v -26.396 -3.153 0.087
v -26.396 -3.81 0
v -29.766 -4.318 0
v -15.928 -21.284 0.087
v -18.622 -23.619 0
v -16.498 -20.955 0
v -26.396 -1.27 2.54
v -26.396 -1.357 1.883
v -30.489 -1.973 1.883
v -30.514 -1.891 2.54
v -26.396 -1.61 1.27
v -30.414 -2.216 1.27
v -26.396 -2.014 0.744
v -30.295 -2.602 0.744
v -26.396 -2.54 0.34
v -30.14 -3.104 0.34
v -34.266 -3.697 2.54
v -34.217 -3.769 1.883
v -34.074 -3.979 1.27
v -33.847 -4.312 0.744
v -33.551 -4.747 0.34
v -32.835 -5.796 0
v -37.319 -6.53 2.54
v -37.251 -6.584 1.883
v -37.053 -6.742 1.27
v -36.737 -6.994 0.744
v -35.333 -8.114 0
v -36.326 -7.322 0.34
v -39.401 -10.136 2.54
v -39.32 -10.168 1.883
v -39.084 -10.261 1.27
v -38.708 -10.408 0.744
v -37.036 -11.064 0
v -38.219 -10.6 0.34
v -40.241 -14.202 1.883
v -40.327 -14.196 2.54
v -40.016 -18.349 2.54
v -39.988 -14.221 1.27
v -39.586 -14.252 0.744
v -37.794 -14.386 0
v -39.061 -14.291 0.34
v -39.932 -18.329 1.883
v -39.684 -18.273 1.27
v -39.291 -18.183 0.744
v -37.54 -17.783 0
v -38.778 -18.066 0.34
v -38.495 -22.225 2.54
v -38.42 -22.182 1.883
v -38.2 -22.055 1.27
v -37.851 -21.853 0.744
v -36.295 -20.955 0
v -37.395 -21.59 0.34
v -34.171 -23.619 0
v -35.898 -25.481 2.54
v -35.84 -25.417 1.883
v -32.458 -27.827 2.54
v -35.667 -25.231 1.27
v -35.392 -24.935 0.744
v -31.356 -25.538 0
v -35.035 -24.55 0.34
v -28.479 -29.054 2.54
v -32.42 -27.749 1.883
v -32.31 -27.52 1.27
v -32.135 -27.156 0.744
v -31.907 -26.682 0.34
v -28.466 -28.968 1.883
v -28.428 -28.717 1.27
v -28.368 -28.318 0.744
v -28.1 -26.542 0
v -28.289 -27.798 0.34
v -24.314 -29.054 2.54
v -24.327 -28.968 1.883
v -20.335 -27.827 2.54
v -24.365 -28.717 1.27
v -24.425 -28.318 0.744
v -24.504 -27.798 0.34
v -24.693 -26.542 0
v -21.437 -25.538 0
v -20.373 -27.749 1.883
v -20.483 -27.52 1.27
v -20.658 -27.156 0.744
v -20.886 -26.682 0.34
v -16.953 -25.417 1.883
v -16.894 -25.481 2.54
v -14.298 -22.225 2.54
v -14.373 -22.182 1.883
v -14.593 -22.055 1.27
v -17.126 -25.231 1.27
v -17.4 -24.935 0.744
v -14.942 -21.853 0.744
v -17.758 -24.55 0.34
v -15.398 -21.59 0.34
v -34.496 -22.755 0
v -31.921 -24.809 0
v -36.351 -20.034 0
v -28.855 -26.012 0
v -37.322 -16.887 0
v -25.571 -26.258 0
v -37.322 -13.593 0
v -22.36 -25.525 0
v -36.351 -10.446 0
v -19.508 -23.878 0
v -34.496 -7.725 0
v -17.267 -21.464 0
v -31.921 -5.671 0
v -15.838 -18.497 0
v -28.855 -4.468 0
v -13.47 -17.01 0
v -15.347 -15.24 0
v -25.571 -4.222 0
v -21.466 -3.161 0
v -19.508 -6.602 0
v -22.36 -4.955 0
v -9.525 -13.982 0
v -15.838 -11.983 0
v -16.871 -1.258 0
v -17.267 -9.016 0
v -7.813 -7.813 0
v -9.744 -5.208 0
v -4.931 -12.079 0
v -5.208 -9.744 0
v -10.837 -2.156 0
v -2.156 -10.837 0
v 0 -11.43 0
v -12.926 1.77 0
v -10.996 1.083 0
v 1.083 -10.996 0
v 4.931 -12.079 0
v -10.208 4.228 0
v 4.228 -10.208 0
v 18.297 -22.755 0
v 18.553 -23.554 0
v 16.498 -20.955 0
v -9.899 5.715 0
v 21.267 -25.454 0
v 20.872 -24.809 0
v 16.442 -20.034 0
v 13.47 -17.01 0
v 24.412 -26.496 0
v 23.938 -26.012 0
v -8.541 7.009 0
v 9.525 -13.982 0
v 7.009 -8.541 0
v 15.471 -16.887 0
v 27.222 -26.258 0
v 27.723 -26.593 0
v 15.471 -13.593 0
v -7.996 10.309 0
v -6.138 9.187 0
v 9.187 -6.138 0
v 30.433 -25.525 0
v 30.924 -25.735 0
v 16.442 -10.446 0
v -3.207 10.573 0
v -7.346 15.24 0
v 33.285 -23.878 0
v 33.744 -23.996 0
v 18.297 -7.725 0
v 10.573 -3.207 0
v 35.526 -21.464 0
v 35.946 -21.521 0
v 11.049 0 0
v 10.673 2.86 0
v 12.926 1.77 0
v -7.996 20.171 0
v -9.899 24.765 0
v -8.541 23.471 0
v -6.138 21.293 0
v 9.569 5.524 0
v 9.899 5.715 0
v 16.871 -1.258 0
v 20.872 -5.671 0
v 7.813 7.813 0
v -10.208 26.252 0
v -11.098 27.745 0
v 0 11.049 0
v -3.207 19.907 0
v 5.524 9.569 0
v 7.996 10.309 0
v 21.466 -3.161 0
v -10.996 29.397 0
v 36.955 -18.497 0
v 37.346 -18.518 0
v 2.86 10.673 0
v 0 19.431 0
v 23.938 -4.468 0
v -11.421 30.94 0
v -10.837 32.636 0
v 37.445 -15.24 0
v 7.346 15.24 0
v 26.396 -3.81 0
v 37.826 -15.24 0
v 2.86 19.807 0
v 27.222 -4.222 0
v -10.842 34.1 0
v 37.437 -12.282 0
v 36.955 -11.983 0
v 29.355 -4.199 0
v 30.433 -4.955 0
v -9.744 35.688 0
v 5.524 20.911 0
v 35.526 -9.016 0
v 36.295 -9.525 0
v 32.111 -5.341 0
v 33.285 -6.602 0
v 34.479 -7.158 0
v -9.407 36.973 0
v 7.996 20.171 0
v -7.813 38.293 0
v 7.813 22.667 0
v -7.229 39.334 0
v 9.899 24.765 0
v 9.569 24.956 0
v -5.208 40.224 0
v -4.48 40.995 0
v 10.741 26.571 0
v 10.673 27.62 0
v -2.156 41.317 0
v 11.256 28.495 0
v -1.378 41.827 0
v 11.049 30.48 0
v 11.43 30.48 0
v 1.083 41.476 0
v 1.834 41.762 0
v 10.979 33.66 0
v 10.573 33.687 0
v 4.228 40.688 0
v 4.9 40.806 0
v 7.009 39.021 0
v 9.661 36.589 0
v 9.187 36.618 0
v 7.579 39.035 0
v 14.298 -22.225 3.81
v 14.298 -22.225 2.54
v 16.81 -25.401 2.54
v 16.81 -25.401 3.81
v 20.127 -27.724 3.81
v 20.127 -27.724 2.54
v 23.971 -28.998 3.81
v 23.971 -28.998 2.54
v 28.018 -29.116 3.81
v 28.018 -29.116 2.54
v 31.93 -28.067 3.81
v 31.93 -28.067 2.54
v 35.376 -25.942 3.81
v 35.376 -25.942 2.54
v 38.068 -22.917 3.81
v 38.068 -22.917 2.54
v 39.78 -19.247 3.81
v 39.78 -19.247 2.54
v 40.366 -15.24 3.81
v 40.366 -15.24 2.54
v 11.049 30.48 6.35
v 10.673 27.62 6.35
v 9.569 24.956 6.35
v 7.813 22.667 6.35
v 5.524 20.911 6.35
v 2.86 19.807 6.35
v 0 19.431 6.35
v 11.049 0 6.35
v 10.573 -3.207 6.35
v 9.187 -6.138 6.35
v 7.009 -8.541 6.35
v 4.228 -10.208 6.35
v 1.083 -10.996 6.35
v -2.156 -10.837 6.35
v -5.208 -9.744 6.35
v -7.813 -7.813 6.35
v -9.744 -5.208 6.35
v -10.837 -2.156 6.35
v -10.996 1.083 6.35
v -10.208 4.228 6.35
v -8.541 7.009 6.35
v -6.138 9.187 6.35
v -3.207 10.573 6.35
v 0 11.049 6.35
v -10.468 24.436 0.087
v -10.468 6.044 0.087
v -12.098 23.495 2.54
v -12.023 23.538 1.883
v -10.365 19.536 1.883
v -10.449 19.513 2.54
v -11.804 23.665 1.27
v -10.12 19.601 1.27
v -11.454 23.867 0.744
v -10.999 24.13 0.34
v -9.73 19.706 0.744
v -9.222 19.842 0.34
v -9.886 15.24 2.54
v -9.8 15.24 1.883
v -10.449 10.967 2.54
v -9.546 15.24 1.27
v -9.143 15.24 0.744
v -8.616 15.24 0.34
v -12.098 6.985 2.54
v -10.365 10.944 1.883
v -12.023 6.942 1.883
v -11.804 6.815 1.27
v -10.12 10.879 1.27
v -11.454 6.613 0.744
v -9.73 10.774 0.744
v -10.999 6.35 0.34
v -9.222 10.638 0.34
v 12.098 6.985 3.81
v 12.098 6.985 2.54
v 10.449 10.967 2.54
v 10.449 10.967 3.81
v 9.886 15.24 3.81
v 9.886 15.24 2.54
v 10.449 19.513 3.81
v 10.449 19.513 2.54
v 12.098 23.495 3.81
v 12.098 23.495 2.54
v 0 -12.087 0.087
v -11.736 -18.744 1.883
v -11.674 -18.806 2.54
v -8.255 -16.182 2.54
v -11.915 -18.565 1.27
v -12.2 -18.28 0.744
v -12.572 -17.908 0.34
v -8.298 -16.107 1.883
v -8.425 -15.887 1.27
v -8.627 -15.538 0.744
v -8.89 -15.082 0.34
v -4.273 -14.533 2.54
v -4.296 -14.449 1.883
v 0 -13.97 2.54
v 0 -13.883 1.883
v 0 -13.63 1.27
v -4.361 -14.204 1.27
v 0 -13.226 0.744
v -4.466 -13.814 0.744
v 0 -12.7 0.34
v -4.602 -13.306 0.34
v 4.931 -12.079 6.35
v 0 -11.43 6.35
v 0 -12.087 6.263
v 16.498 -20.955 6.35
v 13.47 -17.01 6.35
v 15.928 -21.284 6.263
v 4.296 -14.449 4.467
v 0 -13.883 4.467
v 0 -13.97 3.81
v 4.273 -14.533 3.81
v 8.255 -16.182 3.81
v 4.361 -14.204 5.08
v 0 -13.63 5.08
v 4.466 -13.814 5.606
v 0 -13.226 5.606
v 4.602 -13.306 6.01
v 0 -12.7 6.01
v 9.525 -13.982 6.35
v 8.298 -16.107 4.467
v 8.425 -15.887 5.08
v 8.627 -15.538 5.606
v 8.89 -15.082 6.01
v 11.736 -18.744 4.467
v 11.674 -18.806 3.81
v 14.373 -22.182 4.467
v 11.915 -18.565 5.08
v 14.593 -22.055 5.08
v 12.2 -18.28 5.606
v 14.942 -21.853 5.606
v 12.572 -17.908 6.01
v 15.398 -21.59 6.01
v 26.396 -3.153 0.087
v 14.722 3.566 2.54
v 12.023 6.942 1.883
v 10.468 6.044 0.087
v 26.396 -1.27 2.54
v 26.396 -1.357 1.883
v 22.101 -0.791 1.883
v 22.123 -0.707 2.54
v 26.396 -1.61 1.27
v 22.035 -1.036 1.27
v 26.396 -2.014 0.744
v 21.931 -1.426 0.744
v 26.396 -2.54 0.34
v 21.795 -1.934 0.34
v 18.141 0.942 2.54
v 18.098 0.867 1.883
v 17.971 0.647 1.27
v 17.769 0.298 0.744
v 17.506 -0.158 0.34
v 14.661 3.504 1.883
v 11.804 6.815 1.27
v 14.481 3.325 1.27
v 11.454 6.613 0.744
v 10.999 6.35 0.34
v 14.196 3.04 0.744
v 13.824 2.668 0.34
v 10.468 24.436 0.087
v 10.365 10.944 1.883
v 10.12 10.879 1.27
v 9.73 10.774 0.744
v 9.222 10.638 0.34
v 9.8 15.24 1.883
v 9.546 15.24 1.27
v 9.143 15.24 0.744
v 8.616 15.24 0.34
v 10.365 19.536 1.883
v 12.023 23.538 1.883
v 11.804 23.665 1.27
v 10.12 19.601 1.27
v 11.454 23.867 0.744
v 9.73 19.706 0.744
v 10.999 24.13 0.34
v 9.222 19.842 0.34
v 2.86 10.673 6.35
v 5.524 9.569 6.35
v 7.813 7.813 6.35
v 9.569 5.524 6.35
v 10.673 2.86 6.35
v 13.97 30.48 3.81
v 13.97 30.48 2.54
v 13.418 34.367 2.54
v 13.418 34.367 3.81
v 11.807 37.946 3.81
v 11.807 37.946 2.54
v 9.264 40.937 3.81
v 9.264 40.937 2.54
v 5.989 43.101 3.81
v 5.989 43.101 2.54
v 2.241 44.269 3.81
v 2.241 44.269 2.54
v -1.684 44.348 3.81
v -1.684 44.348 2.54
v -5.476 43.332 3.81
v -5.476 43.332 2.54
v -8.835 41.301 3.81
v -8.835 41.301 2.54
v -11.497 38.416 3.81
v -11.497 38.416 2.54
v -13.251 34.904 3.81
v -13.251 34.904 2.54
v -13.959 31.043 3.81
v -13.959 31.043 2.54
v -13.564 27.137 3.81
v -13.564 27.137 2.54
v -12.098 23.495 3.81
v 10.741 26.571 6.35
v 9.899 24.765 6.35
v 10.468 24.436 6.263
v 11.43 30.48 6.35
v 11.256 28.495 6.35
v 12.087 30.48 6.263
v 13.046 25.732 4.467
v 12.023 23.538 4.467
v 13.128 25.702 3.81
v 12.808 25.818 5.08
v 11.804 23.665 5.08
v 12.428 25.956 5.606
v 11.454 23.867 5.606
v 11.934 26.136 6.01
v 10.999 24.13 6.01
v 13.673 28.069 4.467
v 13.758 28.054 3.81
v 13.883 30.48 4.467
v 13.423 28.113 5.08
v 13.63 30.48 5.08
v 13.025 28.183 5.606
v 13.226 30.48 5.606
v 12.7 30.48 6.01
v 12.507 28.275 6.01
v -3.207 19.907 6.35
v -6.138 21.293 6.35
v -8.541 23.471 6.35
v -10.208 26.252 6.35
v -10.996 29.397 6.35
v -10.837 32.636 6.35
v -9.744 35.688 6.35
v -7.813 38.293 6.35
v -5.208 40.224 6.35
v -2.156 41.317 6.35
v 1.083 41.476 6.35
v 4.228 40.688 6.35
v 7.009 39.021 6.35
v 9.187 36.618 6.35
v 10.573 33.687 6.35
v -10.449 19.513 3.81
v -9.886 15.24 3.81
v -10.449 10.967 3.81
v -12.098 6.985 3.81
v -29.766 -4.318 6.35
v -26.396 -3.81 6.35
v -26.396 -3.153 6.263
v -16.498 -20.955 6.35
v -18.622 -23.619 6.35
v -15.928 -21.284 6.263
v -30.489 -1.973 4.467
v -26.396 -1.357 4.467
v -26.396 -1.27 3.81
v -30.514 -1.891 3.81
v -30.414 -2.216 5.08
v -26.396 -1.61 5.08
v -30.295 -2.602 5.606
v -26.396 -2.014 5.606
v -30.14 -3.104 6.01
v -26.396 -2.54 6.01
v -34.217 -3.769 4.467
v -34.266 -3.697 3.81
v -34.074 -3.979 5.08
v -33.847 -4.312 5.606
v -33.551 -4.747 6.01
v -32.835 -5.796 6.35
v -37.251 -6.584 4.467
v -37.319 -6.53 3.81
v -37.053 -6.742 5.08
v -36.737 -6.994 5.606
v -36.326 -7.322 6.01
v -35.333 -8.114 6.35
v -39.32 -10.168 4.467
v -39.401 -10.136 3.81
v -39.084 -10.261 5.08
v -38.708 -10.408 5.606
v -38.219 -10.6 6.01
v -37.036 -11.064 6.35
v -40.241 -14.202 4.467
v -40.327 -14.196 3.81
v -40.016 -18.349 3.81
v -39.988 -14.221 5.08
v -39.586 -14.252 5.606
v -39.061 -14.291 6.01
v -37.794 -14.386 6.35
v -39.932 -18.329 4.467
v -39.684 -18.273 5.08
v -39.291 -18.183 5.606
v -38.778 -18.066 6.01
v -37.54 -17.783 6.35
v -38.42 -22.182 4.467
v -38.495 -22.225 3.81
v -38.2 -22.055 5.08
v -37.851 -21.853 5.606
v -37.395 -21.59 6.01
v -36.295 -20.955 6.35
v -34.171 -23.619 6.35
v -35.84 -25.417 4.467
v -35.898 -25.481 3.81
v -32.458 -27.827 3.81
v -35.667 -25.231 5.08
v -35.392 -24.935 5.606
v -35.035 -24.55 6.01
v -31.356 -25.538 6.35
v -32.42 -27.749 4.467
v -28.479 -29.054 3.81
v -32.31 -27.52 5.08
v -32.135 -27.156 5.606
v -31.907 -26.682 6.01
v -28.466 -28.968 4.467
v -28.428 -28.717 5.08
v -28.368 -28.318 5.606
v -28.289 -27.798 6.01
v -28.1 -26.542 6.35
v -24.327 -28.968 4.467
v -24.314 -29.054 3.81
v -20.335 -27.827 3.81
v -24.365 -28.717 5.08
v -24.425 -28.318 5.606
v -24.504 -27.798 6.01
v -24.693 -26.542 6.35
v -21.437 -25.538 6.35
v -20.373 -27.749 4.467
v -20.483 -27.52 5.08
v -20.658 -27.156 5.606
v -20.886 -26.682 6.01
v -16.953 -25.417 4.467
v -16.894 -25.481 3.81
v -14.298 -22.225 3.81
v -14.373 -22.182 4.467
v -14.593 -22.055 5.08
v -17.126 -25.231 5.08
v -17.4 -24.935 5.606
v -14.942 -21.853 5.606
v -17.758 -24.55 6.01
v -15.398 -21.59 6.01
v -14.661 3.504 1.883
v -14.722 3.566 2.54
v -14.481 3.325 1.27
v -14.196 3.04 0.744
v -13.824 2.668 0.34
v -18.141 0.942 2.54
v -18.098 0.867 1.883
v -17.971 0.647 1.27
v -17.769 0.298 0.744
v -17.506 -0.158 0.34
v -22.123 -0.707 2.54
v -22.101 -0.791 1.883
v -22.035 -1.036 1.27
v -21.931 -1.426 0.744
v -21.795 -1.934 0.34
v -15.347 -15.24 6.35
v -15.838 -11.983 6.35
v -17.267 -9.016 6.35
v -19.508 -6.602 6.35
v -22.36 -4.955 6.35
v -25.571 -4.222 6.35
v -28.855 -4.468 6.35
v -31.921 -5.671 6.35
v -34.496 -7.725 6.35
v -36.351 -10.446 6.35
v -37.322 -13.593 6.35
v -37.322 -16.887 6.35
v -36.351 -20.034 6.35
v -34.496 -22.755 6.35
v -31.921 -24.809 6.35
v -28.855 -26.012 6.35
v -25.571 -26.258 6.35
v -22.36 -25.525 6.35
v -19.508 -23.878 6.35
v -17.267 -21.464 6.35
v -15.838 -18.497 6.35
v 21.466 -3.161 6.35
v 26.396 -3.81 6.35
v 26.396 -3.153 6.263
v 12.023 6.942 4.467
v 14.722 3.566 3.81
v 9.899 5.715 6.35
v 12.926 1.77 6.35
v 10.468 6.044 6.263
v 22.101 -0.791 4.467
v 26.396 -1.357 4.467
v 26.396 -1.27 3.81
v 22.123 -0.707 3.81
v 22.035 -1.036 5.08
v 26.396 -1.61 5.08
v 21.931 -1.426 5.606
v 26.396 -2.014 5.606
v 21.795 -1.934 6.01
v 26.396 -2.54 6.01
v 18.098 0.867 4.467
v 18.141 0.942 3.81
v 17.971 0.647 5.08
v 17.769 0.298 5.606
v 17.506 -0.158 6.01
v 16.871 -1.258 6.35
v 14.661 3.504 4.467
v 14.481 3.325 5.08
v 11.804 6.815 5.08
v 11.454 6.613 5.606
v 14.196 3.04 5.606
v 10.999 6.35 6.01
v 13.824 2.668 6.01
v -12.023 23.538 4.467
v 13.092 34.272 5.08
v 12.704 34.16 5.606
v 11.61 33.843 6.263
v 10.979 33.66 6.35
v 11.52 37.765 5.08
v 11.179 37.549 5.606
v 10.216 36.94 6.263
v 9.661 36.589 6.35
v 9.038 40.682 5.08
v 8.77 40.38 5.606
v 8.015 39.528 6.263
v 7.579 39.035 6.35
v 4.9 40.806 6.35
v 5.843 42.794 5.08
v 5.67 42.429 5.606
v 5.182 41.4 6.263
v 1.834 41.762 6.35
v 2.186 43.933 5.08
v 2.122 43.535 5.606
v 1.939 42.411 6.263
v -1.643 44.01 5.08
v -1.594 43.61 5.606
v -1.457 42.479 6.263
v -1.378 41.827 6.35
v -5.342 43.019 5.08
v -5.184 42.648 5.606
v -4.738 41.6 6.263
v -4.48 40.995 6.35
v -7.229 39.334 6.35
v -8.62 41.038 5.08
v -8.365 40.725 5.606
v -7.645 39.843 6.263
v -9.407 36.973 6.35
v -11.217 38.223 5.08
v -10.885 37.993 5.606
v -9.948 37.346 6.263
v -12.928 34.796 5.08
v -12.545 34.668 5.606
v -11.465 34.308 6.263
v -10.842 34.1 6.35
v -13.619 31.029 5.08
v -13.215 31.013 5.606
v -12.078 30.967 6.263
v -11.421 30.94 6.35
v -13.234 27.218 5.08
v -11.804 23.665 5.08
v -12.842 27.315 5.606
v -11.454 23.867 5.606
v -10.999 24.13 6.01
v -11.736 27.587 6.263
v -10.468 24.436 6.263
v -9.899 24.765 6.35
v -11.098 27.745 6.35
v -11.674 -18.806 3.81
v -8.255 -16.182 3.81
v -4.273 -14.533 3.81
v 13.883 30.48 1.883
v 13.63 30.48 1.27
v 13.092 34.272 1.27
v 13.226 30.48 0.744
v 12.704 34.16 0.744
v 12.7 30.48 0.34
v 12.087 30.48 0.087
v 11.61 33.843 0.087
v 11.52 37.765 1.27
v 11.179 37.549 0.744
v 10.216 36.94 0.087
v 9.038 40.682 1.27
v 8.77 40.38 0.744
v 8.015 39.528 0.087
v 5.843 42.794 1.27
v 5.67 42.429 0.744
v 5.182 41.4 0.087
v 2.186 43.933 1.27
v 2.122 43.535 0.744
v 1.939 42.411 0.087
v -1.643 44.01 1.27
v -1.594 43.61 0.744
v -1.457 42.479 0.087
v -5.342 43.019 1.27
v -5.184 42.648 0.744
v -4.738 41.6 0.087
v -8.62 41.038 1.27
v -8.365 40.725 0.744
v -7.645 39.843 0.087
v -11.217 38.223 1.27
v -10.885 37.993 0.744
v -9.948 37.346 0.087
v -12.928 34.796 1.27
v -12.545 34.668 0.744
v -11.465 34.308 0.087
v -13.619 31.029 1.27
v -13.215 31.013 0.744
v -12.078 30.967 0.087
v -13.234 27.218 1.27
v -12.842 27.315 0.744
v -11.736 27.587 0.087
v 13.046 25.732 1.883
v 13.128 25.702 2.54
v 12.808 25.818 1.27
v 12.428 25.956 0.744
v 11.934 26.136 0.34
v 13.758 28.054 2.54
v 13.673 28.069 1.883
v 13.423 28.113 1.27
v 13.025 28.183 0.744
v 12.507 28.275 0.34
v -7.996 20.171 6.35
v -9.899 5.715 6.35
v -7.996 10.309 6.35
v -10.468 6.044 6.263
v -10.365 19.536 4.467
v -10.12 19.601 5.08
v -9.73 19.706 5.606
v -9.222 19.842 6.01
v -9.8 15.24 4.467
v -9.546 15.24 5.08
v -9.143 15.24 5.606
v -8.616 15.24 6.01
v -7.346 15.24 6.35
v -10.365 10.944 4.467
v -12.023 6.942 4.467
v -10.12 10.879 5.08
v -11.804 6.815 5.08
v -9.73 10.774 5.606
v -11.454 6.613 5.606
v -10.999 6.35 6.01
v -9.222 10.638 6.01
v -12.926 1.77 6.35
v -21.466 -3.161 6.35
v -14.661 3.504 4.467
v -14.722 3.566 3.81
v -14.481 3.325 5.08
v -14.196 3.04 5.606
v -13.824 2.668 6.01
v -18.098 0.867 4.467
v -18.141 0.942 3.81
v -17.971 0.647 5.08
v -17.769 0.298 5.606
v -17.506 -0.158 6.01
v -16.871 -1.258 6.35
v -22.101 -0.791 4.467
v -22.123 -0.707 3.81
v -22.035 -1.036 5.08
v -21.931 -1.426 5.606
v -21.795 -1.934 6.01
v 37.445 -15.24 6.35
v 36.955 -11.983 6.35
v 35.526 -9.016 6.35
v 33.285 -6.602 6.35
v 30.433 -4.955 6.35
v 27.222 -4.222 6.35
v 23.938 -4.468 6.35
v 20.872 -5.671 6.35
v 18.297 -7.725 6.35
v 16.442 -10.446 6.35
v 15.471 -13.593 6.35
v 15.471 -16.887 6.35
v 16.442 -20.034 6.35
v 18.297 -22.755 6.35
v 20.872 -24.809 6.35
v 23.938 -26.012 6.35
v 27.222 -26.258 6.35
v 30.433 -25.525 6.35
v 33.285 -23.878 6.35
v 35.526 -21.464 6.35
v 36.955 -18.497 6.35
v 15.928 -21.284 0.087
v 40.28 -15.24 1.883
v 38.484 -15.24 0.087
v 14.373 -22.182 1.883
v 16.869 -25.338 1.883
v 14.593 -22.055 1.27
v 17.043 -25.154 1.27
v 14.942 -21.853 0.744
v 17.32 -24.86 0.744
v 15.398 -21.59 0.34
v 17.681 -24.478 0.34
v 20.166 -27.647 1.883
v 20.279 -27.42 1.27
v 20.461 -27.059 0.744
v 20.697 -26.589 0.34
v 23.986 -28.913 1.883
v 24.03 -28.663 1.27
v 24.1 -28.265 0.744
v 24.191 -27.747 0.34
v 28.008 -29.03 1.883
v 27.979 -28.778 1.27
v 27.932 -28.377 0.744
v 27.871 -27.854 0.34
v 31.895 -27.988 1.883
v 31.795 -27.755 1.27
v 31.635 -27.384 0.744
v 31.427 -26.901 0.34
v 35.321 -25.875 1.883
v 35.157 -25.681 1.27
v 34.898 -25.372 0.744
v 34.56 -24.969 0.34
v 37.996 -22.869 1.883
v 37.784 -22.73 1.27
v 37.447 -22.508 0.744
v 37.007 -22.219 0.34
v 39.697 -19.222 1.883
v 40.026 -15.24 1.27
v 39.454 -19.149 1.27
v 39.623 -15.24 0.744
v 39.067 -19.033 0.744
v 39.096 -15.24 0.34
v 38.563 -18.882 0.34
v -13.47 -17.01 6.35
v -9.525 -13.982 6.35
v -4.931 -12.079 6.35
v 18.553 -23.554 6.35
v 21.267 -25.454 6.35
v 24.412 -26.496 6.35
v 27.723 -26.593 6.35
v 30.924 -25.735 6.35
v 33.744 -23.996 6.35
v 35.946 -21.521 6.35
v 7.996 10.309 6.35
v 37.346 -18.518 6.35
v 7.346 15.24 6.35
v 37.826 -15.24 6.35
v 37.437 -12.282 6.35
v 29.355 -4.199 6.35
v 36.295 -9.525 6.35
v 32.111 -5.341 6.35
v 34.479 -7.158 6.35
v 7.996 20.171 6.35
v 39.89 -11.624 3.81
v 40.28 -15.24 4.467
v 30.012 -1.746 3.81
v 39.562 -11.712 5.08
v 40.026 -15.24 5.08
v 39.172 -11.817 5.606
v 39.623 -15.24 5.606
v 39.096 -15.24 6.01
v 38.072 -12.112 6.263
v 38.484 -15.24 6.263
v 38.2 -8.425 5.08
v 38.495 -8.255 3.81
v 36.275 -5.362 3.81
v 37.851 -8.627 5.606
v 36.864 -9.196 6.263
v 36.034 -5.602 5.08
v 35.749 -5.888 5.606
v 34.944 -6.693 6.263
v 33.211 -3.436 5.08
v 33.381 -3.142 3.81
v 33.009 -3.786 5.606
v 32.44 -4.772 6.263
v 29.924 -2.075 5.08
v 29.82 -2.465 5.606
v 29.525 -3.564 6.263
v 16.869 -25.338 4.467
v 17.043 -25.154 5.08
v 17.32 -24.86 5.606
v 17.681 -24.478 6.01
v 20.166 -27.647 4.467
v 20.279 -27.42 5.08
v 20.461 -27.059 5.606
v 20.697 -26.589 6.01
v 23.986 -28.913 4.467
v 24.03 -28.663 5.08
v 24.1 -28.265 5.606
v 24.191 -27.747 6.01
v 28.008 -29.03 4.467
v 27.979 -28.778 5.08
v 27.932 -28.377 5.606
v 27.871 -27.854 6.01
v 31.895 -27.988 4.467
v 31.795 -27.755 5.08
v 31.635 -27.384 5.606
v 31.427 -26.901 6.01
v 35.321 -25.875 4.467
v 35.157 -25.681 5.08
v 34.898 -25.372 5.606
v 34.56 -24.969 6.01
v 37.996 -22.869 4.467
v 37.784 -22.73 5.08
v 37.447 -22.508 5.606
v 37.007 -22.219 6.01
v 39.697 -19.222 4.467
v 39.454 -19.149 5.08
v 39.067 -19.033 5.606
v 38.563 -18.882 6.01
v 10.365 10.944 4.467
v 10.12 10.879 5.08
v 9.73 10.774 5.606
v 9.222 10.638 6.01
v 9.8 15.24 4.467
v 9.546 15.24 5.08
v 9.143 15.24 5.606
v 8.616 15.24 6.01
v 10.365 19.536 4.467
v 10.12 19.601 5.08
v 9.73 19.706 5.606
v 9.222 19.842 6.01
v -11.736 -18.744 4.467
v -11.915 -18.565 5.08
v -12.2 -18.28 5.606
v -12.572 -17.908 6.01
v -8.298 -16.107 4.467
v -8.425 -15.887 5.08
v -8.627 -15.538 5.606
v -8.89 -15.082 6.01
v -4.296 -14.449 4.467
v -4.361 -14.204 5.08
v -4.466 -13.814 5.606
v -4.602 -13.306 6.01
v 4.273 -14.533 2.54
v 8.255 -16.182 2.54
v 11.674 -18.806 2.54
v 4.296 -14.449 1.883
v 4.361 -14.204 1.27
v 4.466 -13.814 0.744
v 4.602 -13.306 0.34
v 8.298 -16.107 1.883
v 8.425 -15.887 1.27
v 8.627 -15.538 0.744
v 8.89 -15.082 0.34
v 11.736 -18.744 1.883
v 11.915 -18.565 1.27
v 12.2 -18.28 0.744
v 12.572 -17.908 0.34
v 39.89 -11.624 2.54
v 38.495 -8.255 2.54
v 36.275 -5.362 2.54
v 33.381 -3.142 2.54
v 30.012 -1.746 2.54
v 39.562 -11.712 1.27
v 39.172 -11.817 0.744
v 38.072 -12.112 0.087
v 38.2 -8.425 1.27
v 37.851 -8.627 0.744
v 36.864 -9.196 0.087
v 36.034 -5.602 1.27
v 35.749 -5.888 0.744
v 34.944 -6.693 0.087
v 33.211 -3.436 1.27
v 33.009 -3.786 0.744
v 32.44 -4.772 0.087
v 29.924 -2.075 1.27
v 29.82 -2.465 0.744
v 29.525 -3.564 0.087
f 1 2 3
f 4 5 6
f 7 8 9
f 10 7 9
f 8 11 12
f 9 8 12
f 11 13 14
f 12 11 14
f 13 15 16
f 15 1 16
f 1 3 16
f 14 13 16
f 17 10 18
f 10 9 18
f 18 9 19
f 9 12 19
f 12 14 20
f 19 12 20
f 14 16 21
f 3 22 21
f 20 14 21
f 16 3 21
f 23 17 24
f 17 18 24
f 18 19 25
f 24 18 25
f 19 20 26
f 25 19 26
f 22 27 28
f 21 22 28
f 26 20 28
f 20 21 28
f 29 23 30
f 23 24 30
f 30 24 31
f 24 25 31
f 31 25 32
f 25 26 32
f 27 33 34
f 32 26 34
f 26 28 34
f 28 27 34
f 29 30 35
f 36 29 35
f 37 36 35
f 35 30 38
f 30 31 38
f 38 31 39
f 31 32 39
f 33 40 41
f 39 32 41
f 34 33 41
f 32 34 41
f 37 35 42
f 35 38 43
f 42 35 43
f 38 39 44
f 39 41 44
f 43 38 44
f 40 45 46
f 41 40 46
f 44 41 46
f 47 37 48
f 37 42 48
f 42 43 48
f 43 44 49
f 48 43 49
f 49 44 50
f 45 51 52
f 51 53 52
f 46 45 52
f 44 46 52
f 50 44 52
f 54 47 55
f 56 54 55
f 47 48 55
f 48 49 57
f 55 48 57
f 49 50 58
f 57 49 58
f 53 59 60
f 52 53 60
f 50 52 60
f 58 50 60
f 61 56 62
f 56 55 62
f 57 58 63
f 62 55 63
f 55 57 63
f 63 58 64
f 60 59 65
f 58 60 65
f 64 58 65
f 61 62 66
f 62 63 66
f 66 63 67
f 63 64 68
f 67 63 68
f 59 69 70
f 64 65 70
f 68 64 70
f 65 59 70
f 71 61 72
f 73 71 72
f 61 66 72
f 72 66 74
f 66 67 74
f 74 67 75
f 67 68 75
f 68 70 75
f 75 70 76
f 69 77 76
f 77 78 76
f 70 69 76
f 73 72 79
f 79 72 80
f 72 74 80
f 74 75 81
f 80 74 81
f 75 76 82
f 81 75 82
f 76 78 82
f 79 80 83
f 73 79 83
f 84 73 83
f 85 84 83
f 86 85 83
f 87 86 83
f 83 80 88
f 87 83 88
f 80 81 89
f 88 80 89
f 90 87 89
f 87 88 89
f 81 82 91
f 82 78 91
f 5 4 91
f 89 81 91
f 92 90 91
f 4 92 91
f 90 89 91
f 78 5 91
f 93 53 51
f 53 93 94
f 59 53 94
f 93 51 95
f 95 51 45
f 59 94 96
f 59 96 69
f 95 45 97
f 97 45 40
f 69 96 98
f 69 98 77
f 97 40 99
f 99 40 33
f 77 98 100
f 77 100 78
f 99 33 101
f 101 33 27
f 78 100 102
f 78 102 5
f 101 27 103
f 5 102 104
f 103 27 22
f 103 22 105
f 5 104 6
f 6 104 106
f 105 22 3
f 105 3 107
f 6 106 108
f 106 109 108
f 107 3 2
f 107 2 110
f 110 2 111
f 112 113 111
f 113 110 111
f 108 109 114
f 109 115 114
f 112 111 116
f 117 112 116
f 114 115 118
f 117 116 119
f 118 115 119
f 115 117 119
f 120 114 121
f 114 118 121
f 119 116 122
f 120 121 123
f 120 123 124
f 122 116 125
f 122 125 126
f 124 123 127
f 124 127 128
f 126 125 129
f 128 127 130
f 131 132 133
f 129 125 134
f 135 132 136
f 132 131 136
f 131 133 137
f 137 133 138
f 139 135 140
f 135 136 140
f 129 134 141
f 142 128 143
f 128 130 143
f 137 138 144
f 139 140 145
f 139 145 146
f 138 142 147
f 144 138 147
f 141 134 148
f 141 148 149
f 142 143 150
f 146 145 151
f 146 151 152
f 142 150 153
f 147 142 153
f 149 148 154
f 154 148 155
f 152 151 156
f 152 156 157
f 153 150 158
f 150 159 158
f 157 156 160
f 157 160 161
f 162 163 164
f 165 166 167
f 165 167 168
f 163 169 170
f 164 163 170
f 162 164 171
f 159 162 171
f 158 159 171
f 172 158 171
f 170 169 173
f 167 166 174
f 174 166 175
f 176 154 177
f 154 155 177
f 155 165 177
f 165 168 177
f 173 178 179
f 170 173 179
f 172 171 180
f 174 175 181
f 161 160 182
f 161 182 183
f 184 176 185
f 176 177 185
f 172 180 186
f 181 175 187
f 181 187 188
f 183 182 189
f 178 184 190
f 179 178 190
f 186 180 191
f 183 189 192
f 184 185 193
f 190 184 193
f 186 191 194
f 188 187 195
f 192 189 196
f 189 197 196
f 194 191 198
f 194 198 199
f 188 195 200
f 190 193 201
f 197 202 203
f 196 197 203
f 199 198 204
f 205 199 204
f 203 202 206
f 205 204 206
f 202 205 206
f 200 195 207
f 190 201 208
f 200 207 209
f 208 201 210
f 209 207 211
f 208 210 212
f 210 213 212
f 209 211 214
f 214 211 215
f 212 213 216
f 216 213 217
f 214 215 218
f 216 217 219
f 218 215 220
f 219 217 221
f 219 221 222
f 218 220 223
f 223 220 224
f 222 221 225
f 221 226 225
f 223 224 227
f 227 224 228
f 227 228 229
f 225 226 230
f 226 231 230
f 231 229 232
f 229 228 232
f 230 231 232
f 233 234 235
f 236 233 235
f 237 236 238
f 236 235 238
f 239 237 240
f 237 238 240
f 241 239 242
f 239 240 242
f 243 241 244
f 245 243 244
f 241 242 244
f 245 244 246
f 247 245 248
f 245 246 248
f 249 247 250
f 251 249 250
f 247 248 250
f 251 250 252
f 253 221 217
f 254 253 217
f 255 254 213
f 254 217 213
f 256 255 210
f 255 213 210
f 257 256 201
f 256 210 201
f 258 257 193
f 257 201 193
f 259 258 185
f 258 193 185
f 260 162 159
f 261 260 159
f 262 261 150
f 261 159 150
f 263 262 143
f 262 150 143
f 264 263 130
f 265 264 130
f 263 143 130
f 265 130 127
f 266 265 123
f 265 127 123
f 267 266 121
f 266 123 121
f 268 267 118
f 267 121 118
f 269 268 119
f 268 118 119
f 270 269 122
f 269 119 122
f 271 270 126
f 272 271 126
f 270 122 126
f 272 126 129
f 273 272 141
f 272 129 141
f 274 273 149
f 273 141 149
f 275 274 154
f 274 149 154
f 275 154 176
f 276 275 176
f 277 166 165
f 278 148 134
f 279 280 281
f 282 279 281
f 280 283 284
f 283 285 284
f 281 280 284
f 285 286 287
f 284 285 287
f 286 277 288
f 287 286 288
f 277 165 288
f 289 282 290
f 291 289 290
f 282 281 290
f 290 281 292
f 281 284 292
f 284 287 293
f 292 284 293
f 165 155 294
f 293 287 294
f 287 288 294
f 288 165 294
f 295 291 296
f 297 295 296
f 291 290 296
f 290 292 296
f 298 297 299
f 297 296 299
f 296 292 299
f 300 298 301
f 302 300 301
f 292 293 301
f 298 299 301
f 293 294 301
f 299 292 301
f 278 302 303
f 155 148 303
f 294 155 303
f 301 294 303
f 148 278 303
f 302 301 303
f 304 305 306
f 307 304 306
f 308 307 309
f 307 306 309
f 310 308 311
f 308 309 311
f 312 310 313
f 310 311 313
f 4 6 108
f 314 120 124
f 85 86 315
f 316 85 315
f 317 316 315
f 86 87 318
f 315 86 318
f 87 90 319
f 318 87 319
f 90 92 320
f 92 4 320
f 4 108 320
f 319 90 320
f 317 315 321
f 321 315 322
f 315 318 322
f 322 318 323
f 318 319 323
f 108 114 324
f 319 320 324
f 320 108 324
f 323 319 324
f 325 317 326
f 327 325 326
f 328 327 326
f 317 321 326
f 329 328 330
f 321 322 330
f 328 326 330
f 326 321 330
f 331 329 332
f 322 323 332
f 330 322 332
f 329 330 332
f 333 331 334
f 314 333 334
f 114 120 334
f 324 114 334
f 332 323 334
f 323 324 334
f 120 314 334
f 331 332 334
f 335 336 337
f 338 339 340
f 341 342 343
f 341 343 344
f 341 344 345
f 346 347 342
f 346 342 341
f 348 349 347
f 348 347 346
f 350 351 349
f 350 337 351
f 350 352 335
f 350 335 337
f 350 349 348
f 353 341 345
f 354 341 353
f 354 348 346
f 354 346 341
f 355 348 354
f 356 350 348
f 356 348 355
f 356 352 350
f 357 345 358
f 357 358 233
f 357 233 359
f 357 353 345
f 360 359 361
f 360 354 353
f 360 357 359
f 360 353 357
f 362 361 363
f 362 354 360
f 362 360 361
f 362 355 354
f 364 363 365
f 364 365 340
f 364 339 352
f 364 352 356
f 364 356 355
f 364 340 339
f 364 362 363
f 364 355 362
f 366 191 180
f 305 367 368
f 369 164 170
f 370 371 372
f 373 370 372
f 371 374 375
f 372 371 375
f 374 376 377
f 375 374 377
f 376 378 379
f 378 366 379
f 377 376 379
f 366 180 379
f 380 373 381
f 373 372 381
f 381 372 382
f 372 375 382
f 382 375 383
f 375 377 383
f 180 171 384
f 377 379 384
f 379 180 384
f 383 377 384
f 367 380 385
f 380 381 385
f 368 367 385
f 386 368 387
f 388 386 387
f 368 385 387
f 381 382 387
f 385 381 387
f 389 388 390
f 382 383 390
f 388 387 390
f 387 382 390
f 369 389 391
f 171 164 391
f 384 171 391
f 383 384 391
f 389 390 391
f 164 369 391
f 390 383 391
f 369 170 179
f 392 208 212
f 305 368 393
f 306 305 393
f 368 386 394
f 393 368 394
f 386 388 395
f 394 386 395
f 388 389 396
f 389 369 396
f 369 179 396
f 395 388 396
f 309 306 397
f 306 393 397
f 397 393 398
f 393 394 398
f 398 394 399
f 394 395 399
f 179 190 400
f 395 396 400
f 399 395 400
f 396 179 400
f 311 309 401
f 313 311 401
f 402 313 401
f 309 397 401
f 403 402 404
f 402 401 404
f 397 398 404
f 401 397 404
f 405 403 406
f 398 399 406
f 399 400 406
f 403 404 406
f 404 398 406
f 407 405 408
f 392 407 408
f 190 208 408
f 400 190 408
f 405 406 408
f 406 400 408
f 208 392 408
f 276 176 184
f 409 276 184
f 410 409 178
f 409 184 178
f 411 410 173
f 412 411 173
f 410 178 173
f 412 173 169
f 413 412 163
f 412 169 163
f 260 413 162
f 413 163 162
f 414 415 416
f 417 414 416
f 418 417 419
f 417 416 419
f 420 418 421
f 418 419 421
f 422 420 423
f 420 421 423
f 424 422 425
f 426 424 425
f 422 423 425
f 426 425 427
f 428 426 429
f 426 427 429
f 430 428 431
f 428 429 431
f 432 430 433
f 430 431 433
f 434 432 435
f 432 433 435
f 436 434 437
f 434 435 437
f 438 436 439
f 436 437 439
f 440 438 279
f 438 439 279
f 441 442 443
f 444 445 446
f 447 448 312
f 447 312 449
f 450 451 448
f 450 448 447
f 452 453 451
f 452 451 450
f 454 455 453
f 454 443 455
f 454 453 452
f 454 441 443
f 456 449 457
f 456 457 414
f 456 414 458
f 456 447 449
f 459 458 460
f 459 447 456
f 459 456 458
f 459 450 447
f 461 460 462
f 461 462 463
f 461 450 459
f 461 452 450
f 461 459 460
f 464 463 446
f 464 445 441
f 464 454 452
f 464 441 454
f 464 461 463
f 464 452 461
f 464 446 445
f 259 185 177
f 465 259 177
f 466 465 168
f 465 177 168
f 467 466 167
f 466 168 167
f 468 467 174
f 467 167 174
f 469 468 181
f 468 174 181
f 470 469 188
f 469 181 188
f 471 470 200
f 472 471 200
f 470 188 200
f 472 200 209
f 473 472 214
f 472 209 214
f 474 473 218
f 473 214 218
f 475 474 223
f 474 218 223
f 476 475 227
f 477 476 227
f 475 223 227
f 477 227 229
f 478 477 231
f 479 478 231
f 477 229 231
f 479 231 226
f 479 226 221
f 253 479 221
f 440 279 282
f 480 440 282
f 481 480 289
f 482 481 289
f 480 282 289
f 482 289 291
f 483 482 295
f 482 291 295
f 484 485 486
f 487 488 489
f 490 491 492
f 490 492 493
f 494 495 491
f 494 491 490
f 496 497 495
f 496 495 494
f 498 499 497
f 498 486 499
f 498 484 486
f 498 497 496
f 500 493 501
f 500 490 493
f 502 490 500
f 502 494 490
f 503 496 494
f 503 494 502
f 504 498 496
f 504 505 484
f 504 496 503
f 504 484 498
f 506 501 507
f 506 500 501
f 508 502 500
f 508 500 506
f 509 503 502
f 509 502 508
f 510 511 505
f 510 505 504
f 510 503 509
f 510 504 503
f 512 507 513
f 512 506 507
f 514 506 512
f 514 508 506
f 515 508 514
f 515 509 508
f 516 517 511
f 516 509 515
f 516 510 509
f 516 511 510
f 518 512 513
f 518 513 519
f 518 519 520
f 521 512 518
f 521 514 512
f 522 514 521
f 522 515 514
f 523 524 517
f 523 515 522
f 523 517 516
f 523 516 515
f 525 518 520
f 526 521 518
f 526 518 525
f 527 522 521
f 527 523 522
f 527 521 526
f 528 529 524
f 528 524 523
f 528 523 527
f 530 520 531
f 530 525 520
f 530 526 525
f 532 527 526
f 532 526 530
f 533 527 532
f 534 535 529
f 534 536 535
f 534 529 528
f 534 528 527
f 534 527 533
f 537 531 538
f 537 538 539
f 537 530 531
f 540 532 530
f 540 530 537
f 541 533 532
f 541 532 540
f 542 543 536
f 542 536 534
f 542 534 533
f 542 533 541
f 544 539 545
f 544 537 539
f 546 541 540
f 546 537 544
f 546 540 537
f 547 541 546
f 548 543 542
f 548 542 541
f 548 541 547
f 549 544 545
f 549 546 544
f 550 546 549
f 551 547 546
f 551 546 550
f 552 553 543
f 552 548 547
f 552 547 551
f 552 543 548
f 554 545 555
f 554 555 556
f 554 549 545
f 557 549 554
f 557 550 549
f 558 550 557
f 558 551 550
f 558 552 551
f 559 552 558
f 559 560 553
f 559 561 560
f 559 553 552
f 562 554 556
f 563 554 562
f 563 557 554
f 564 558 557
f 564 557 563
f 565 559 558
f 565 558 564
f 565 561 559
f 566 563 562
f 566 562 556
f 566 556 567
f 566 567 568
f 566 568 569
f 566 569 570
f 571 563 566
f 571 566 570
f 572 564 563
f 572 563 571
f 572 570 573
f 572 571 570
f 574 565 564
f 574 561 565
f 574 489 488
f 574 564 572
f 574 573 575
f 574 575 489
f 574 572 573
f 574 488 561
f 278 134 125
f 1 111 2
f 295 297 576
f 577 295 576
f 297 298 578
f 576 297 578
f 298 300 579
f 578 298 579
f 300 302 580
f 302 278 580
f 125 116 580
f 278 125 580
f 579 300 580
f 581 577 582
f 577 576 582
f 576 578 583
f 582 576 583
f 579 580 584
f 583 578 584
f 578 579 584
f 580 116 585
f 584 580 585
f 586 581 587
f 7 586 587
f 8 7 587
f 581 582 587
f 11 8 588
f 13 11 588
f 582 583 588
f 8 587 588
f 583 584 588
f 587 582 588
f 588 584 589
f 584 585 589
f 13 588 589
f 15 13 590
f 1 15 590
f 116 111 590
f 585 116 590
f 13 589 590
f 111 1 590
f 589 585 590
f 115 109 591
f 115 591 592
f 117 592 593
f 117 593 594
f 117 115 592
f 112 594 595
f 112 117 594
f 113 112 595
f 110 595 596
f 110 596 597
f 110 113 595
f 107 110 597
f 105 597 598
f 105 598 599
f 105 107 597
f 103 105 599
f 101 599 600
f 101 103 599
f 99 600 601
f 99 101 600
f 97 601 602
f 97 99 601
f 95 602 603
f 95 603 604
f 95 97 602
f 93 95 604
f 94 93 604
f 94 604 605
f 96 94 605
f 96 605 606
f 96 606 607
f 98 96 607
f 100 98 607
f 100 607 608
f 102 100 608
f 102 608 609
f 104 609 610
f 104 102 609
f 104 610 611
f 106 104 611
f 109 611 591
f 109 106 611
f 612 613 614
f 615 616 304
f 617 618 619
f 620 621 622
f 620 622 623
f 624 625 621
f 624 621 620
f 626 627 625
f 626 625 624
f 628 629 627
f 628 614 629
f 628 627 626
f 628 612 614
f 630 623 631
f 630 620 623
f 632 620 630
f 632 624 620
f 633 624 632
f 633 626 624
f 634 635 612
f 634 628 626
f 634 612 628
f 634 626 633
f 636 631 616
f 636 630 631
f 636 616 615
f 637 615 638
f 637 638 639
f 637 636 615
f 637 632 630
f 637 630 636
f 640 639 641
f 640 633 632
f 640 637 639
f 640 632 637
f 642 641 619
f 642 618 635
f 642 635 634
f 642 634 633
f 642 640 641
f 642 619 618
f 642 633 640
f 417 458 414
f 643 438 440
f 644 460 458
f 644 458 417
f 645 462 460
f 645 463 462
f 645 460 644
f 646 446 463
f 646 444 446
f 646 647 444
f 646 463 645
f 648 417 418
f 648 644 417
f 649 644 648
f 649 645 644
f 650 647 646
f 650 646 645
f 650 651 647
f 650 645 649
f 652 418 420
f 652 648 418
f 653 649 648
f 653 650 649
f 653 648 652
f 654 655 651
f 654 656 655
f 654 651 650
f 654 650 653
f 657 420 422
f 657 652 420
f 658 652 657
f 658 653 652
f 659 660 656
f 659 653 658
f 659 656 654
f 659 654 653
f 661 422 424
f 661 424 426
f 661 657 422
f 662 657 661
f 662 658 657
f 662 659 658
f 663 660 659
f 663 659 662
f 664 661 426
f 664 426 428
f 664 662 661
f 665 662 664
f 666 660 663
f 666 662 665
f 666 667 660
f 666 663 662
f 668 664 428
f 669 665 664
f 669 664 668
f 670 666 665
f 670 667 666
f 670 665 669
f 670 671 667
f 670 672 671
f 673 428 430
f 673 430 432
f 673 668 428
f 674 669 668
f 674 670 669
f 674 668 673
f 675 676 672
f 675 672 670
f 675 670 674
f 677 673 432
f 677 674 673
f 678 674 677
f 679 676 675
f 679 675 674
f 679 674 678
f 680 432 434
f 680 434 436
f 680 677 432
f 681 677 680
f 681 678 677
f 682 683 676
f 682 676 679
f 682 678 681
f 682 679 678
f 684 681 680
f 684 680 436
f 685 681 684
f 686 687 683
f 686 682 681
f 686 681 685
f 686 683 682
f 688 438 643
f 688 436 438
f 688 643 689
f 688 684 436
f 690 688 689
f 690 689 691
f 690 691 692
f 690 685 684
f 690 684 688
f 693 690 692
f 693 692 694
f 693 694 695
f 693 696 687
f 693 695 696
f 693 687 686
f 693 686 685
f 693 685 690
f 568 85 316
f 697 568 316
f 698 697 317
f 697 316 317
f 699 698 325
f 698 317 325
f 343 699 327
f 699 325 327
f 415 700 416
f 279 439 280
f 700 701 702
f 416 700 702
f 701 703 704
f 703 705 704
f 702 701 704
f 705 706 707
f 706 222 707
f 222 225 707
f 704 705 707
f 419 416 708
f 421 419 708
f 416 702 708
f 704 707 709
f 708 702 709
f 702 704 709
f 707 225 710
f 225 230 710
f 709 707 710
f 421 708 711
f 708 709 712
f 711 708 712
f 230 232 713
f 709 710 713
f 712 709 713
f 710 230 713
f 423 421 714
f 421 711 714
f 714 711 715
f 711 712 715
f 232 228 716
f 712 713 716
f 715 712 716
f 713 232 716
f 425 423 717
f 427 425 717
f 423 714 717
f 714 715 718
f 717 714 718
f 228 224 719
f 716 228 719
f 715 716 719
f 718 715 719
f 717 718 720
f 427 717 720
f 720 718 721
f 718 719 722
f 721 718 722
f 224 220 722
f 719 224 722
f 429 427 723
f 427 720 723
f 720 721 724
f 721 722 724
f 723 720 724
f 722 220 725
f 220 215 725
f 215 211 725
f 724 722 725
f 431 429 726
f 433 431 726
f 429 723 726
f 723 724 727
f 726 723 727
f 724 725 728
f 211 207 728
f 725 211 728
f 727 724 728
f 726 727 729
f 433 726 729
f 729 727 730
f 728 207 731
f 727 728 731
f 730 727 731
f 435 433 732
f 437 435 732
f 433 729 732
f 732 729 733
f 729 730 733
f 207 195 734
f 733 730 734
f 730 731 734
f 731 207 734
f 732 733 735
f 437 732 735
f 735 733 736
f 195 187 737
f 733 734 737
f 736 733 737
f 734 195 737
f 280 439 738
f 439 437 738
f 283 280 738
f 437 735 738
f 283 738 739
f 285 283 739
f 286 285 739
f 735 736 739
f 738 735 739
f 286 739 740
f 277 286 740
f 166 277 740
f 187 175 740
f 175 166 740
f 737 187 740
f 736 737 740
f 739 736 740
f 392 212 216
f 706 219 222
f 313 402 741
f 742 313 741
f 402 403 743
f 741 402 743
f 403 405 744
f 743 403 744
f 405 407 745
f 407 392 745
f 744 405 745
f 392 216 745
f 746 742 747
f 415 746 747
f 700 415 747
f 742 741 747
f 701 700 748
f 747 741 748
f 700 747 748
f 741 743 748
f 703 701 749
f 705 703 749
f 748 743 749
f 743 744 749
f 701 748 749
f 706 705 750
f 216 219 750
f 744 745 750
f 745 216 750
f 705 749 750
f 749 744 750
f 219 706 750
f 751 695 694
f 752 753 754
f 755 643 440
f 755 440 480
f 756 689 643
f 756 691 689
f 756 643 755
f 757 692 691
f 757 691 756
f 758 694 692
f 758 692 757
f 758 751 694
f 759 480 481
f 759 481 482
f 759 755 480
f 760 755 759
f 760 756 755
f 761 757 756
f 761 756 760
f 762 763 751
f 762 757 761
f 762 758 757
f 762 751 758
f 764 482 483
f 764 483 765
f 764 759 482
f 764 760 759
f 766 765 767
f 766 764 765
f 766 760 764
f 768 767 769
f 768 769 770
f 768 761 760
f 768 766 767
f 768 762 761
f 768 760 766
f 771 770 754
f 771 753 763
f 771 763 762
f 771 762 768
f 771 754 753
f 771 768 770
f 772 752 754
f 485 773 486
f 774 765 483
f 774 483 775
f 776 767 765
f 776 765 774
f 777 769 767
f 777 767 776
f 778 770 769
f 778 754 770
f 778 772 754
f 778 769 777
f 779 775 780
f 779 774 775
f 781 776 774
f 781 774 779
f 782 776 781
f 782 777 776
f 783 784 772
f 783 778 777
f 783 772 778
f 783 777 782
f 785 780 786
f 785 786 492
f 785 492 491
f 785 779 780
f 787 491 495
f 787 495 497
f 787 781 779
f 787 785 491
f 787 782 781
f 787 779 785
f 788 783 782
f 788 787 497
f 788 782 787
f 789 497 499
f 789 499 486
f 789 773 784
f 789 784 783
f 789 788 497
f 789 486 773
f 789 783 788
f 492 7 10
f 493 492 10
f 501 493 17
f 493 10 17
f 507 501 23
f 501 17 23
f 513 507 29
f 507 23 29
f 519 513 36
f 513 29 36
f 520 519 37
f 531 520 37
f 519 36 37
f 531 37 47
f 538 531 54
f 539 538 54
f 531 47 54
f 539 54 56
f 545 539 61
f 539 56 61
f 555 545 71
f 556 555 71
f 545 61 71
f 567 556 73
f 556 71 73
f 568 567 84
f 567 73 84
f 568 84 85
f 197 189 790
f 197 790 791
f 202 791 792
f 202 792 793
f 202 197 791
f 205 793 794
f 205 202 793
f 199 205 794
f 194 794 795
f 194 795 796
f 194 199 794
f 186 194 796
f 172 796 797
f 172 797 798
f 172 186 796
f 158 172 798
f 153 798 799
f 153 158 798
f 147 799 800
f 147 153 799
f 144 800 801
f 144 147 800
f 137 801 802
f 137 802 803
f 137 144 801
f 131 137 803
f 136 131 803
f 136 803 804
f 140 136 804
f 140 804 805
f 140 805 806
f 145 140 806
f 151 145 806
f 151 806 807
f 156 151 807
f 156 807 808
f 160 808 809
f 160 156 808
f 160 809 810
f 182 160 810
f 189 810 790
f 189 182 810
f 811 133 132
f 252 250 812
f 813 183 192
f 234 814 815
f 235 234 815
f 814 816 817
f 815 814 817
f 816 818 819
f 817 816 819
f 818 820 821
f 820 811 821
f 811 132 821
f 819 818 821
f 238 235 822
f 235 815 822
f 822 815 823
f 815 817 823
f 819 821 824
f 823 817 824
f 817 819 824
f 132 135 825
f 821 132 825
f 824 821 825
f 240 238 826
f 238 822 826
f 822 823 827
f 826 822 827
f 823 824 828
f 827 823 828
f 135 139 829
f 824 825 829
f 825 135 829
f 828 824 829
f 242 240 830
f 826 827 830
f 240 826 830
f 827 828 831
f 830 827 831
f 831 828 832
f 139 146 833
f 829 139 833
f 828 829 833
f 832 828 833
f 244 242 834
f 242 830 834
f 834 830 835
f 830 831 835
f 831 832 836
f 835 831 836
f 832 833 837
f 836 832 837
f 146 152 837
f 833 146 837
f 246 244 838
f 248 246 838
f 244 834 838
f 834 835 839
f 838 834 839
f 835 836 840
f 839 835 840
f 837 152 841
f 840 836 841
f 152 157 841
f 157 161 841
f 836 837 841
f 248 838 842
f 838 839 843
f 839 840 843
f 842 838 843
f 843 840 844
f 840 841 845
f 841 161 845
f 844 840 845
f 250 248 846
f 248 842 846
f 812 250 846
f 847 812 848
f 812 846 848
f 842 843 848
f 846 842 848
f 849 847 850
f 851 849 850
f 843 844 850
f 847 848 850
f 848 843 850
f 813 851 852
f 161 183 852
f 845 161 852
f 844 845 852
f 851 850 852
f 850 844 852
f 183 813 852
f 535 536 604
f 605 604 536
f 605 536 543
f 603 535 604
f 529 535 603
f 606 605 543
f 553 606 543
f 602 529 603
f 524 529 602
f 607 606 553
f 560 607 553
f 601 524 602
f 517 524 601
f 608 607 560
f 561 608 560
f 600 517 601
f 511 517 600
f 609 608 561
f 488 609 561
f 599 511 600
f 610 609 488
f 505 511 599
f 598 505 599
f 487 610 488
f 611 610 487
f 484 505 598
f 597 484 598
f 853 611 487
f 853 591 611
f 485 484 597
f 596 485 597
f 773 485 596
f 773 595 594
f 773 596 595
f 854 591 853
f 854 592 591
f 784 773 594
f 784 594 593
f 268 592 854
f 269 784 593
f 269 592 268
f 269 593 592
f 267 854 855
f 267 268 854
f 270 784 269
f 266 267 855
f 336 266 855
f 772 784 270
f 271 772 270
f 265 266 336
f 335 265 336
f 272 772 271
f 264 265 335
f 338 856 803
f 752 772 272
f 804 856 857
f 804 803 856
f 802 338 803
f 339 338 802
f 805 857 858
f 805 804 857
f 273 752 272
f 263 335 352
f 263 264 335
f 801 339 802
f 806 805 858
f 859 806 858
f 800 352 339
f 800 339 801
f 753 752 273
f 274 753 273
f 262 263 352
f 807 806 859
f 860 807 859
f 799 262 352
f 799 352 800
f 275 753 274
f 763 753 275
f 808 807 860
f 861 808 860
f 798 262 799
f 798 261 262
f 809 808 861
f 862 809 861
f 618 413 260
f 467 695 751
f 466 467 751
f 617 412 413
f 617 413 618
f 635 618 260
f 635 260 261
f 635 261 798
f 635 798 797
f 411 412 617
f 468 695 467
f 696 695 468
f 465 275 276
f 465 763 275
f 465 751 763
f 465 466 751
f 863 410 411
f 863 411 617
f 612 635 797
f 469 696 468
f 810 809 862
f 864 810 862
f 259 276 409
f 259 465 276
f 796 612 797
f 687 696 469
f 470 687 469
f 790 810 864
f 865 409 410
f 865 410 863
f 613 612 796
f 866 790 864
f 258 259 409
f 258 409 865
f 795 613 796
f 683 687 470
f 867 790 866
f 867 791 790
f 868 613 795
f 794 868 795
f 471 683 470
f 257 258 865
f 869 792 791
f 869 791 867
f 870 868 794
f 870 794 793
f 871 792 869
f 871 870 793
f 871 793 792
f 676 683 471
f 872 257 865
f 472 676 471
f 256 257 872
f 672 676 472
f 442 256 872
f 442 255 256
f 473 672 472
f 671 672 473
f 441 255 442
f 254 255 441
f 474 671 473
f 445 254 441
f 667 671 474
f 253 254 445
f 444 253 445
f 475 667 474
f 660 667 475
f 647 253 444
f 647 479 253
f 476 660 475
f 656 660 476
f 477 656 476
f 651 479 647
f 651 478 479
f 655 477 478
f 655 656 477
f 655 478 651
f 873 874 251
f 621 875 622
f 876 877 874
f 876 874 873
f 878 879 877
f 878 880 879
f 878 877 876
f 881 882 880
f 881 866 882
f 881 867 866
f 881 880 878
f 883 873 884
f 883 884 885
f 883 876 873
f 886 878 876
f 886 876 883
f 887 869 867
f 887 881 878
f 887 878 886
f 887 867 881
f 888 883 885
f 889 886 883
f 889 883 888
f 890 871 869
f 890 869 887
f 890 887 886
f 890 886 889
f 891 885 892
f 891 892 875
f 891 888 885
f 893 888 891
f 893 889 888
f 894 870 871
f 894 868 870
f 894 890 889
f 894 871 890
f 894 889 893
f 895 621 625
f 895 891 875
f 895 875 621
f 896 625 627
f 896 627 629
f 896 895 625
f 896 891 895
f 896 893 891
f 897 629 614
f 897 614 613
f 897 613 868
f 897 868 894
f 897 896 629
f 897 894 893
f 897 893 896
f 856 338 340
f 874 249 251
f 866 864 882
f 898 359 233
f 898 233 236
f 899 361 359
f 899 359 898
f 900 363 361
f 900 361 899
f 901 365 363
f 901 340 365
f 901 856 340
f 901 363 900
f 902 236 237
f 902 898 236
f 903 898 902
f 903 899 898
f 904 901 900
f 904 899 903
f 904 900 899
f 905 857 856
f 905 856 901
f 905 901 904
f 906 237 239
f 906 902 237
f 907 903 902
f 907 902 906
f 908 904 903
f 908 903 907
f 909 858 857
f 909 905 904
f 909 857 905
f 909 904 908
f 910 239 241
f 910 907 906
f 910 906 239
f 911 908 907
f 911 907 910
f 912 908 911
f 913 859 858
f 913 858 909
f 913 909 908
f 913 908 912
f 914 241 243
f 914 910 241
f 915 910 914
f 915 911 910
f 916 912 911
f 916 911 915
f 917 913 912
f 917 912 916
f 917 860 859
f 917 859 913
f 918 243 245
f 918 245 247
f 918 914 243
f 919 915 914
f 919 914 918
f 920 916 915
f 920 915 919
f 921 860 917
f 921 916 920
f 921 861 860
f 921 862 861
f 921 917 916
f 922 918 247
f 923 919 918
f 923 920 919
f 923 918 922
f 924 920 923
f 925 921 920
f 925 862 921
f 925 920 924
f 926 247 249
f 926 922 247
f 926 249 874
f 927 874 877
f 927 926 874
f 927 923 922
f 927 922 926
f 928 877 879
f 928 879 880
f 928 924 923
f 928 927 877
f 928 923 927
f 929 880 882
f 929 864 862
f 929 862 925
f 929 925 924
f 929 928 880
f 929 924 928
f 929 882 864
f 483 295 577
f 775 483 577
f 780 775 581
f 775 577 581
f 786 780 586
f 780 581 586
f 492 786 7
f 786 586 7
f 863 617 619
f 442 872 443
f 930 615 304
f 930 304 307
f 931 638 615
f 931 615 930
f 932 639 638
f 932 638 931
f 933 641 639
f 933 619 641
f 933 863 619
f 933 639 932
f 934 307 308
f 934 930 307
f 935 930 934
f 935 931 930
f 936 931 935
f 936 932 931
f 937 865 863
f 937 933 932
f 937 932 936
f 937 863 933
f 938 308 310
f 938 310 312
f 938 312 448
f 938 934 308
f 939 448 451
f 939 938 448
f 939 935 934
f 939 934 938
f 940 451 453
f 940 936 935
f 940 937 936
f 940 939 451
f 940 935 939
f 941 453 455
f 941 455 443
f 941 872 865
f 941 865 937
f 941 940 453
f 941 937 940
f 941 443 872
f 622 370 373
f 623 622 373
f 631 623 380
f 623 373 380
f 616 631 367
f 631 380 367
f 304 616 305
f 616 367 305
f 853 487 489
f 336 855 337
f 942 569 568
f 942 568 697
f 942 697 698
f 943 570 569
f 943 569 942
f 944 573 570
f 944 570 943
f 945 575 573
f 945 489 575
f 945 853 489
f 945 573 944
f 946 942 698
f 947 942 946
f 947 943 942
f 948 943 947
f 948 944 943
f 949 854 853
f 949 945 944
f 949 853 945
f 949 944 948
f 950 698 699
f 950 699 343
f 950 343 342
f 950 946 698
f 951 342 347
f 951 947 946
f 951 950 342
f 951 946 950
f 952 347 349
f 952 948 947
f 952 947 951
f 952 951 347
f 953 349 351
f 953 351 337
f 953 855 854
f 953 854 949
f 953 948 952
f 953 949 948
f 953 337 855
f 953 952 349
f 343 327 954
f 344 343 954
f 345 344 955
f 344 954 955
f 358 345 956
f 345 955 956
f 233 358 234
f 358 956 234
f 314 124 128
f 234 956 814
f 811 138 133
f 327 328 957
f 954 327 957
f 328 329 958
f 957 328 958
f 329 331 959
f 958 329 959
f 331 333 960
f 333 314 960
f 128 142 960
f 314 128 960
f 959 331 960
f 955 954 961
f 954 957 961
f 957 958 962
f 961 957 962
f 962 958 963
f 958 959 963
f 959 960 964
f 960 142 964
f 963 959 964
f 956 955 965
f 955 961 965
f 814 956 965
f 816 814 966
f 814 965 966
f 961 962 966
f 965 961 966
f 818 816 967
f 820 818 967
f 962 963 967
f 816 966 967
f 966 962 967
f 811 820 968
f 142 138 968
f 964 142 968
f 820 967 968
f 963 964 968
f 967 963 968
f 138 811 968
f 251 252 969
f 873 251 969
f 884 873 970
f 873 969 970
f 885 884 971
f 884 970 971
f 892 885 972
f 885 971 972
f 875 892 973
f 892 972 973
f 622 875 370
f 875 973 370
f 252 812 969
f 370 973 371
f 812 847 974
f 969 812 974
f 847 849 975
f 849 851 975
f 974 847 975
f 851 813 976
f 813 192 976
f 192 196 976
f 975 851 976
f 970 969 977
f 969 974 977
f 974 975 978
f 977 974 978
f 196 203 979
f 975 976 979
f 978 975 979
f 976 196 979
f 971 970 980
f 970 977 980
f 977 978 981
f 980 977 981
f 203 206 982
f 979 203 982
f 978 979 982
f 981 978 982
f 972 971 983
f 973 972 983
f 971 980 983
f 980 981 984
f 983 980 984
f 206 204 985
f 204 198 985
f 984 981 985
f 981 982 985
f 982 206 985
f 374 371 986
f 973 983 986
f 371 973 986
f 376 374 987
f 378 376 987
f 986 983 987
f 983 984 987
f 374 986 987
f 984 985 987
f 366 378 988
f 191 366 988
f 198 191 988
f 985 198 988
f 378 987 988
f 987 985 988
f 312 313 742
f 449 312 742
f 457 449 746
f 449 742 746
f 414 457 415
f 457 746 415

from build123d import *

# Parameters (mm, degrees)
F0_R     = 11.049
F1_DEPTH = 6.35
F2_R     = 2.54


with BuildPart() as f1:
    # F0 (on Top) → F1 (new body)
    with BuildSketch(Plane.XY):
        with BuildLine():
            ThreePointArc((0, 11.049), (7.8128228253, 7.8128228253), (11.049, 0))
            ThreePointArc((11.049, 0), (-2.8596916293, -10.6725144547), (-9.5687146864, 5.5245))
            Line((-9.5687146864, 5.5245), (-12.0983748909, 6.985))
            ThreePointArc((-12.0983748842, 6.9850000115), (-12.0983748894, -6.9850000025), (1.9e-08, -13.97))
            ThreePointArc((1.9e-08, -13.97), (9.8782817399, -9.8782817264), (13.97, 0))
            ThreePointArc((13.97, 0), (13.4939838053, 3.6157020152), (12.0983749373, 6.9849999196))
            ThreePointArc((12.0983749373, 6.9849999196), (6.9850000402, 12.0983748677), (0, 13.97))
            Line((0, 13.97), (0, 11.049))
        make_face()
        with BuildLine():
            ThreePointArc((-9.5687146864, 5.5245), (-5.5245, 9.5687146864), (0, 11.049))
            Line((0, 11.049), (0, 13.97))
            ThreePointArc((0, 13.97), (-6.9849999943, 12.0983748942), (-12.0983748842, 6.9850000115))
            Line((-12.0983748909, 6.985), (-9.5687146864, 5.5245))
        make_face()
        with BuildLine():
            Line((0, 16.51), (0, 13.97))
            ThreePointArc((0, 13.97), (6.9850000402, 12.0983748677), (12.0983749373, 6.9849999196))
            ThreePointArc((12.0983749373, 6.9849999196), (9.8864543073, 15.2399999536), (12.0983748909, 23.495))
            ThreePointArc((12.0983748909, 23.495), (6.985, 18.3816251091), (0, 16.51))
        make_face()
        with BuildLine():
            ThreePointArc((-12.0983748842, 6.9850000115), (-6.9849999943, 12.0983748942), (0, 13.97))
            Line((0, 13.97), (0, 16.51))
            ThreePointArc((0, 16.51), (-6.985, 18.3816251091), (-12.0983748909, 23.495))
            ThreePointArc((-12.0983748909, 23.495), (-9.8864543073, 15.2400000066), (-12.0983748842, 6.9850000115))
        make_face()
        with BuildLine():
            ThreePointArc((1.9e-08, -13.97), (-12.0983748894, -6.9850000025), (-12.0983748842, 6.9850000115))
            ThreePointArc((-12.0983748842, 6.9850000115), (-18.1414543016, 0.9419205868), (-26.3964543073, -1.27))
            ThreePointArc((-26.3964543073, -1.27), (-16.5181725742, -5.3617182668), (-12.4264543073, -15.24))
            ThreePointArc((-12.4264543073, -15.24), (-12.9024705141, -18.8557020601), (-14.2980794165, -22.225))
            ThreePointArc((-14.2980794165, -22.225), (-8.2549999918, -16.1819205788), (1.9e-08, -13.97))
        make_face()
        with BuildLine():
            ThreePointArc((26.3964543073, -1.27), (18.1414543475, 0.9419205603), (12.0983749373, 6.9849999196))
            ThreePointArc((12.0983749373, 6.9849999196), (13.4939838053, 3.6157020152), (13.97, 0))
            ThreePointArc((13.97, 0), (9.8782817399, -9.8782817264), (1.9e-08, -13.97))
            ThreePointArc((1.9e-08, -13.97), (8.2550000082, -16.1819205883), (14.2980794165, -22.225))
            ThreePointArc((14.2980794165, -22.225), (14.2980794165, -8.255), (26.3964543073, -1.27))
        make_face()
        with BuildLine():
            ThreePointArc((-12.0983748909, 23.495), (-6.985, 18.3816251091), (0, 16.51))
            ThreePointArc((0, 16.51), (6.985, 18.3816251091), (12.0983748909, 23.495))
            ThreePointArc((12.0983748909, 23.495), (13.4939837933, 26.8642979399), (13.97, 30.48))
            ThreePointArc((13.97, 30.48), (-3.6157020601, 43.9739837933), (-12.0983748909, 23.495))
        make_face()
        with BuildLine():
            ThreePointArc((11.049, 30.48), (7.8128228253, 22.6671771747), (0, 19.431))
            ThreePointArc((0, 19.431), (-7.8128228253, 38.2928228253), (11.049, 30.48))
        make_face(mode=Mode.SUBTRACT)
        with BuildLine():
            ThreePointArc((-12.4264543073, -15.24), (-16.5181725742, -5.3617182668), (-26.3964543073, -1.27))
            ThreePointArc((-26.3964543073, -1.27), (-38.4948291982, -22.225), (-14.2980794165, -22.225))
            ThreePointArc((-14.2980794165, -22.225), (-12.9024705141, -18.8557020601), (-12.4264543073, -15.24))
        make_face()
        with Locations((-26.3964543073, -15.24)):
            Circle(F0_R, mode=Mode.SUBTRACT)
        with BuildLine():
            ThreePointArc((40.3664543073, -15.24), (36.2747360405, -5.3617182668), (26.3964543073, -1.27))
            ThreePointArc((26.3964543073, -1.27), (14.2980794165, -8.255), (14.2980794165, -22.225))
            ThreePointArc((14.2980794165, -22.225), (30.0121563674, -28.7339837933), (40.3664543073, -15.24))
        make_face()
        with Locations((26.3964543073, -15.24)):
            Circle(F0_R, mode=Mode.SUBTRACT)
    extrude(amount=F1_DEPTH)

    # F2
    f2_edges = [f1.edges().sort_by_distance(p)[0] for p in [
        (0, -13.97, 6.35),
        (0, -13.97, 0),
    ]]
    fillet(f2_edges, radius=F2_R)


solid = f1.part
